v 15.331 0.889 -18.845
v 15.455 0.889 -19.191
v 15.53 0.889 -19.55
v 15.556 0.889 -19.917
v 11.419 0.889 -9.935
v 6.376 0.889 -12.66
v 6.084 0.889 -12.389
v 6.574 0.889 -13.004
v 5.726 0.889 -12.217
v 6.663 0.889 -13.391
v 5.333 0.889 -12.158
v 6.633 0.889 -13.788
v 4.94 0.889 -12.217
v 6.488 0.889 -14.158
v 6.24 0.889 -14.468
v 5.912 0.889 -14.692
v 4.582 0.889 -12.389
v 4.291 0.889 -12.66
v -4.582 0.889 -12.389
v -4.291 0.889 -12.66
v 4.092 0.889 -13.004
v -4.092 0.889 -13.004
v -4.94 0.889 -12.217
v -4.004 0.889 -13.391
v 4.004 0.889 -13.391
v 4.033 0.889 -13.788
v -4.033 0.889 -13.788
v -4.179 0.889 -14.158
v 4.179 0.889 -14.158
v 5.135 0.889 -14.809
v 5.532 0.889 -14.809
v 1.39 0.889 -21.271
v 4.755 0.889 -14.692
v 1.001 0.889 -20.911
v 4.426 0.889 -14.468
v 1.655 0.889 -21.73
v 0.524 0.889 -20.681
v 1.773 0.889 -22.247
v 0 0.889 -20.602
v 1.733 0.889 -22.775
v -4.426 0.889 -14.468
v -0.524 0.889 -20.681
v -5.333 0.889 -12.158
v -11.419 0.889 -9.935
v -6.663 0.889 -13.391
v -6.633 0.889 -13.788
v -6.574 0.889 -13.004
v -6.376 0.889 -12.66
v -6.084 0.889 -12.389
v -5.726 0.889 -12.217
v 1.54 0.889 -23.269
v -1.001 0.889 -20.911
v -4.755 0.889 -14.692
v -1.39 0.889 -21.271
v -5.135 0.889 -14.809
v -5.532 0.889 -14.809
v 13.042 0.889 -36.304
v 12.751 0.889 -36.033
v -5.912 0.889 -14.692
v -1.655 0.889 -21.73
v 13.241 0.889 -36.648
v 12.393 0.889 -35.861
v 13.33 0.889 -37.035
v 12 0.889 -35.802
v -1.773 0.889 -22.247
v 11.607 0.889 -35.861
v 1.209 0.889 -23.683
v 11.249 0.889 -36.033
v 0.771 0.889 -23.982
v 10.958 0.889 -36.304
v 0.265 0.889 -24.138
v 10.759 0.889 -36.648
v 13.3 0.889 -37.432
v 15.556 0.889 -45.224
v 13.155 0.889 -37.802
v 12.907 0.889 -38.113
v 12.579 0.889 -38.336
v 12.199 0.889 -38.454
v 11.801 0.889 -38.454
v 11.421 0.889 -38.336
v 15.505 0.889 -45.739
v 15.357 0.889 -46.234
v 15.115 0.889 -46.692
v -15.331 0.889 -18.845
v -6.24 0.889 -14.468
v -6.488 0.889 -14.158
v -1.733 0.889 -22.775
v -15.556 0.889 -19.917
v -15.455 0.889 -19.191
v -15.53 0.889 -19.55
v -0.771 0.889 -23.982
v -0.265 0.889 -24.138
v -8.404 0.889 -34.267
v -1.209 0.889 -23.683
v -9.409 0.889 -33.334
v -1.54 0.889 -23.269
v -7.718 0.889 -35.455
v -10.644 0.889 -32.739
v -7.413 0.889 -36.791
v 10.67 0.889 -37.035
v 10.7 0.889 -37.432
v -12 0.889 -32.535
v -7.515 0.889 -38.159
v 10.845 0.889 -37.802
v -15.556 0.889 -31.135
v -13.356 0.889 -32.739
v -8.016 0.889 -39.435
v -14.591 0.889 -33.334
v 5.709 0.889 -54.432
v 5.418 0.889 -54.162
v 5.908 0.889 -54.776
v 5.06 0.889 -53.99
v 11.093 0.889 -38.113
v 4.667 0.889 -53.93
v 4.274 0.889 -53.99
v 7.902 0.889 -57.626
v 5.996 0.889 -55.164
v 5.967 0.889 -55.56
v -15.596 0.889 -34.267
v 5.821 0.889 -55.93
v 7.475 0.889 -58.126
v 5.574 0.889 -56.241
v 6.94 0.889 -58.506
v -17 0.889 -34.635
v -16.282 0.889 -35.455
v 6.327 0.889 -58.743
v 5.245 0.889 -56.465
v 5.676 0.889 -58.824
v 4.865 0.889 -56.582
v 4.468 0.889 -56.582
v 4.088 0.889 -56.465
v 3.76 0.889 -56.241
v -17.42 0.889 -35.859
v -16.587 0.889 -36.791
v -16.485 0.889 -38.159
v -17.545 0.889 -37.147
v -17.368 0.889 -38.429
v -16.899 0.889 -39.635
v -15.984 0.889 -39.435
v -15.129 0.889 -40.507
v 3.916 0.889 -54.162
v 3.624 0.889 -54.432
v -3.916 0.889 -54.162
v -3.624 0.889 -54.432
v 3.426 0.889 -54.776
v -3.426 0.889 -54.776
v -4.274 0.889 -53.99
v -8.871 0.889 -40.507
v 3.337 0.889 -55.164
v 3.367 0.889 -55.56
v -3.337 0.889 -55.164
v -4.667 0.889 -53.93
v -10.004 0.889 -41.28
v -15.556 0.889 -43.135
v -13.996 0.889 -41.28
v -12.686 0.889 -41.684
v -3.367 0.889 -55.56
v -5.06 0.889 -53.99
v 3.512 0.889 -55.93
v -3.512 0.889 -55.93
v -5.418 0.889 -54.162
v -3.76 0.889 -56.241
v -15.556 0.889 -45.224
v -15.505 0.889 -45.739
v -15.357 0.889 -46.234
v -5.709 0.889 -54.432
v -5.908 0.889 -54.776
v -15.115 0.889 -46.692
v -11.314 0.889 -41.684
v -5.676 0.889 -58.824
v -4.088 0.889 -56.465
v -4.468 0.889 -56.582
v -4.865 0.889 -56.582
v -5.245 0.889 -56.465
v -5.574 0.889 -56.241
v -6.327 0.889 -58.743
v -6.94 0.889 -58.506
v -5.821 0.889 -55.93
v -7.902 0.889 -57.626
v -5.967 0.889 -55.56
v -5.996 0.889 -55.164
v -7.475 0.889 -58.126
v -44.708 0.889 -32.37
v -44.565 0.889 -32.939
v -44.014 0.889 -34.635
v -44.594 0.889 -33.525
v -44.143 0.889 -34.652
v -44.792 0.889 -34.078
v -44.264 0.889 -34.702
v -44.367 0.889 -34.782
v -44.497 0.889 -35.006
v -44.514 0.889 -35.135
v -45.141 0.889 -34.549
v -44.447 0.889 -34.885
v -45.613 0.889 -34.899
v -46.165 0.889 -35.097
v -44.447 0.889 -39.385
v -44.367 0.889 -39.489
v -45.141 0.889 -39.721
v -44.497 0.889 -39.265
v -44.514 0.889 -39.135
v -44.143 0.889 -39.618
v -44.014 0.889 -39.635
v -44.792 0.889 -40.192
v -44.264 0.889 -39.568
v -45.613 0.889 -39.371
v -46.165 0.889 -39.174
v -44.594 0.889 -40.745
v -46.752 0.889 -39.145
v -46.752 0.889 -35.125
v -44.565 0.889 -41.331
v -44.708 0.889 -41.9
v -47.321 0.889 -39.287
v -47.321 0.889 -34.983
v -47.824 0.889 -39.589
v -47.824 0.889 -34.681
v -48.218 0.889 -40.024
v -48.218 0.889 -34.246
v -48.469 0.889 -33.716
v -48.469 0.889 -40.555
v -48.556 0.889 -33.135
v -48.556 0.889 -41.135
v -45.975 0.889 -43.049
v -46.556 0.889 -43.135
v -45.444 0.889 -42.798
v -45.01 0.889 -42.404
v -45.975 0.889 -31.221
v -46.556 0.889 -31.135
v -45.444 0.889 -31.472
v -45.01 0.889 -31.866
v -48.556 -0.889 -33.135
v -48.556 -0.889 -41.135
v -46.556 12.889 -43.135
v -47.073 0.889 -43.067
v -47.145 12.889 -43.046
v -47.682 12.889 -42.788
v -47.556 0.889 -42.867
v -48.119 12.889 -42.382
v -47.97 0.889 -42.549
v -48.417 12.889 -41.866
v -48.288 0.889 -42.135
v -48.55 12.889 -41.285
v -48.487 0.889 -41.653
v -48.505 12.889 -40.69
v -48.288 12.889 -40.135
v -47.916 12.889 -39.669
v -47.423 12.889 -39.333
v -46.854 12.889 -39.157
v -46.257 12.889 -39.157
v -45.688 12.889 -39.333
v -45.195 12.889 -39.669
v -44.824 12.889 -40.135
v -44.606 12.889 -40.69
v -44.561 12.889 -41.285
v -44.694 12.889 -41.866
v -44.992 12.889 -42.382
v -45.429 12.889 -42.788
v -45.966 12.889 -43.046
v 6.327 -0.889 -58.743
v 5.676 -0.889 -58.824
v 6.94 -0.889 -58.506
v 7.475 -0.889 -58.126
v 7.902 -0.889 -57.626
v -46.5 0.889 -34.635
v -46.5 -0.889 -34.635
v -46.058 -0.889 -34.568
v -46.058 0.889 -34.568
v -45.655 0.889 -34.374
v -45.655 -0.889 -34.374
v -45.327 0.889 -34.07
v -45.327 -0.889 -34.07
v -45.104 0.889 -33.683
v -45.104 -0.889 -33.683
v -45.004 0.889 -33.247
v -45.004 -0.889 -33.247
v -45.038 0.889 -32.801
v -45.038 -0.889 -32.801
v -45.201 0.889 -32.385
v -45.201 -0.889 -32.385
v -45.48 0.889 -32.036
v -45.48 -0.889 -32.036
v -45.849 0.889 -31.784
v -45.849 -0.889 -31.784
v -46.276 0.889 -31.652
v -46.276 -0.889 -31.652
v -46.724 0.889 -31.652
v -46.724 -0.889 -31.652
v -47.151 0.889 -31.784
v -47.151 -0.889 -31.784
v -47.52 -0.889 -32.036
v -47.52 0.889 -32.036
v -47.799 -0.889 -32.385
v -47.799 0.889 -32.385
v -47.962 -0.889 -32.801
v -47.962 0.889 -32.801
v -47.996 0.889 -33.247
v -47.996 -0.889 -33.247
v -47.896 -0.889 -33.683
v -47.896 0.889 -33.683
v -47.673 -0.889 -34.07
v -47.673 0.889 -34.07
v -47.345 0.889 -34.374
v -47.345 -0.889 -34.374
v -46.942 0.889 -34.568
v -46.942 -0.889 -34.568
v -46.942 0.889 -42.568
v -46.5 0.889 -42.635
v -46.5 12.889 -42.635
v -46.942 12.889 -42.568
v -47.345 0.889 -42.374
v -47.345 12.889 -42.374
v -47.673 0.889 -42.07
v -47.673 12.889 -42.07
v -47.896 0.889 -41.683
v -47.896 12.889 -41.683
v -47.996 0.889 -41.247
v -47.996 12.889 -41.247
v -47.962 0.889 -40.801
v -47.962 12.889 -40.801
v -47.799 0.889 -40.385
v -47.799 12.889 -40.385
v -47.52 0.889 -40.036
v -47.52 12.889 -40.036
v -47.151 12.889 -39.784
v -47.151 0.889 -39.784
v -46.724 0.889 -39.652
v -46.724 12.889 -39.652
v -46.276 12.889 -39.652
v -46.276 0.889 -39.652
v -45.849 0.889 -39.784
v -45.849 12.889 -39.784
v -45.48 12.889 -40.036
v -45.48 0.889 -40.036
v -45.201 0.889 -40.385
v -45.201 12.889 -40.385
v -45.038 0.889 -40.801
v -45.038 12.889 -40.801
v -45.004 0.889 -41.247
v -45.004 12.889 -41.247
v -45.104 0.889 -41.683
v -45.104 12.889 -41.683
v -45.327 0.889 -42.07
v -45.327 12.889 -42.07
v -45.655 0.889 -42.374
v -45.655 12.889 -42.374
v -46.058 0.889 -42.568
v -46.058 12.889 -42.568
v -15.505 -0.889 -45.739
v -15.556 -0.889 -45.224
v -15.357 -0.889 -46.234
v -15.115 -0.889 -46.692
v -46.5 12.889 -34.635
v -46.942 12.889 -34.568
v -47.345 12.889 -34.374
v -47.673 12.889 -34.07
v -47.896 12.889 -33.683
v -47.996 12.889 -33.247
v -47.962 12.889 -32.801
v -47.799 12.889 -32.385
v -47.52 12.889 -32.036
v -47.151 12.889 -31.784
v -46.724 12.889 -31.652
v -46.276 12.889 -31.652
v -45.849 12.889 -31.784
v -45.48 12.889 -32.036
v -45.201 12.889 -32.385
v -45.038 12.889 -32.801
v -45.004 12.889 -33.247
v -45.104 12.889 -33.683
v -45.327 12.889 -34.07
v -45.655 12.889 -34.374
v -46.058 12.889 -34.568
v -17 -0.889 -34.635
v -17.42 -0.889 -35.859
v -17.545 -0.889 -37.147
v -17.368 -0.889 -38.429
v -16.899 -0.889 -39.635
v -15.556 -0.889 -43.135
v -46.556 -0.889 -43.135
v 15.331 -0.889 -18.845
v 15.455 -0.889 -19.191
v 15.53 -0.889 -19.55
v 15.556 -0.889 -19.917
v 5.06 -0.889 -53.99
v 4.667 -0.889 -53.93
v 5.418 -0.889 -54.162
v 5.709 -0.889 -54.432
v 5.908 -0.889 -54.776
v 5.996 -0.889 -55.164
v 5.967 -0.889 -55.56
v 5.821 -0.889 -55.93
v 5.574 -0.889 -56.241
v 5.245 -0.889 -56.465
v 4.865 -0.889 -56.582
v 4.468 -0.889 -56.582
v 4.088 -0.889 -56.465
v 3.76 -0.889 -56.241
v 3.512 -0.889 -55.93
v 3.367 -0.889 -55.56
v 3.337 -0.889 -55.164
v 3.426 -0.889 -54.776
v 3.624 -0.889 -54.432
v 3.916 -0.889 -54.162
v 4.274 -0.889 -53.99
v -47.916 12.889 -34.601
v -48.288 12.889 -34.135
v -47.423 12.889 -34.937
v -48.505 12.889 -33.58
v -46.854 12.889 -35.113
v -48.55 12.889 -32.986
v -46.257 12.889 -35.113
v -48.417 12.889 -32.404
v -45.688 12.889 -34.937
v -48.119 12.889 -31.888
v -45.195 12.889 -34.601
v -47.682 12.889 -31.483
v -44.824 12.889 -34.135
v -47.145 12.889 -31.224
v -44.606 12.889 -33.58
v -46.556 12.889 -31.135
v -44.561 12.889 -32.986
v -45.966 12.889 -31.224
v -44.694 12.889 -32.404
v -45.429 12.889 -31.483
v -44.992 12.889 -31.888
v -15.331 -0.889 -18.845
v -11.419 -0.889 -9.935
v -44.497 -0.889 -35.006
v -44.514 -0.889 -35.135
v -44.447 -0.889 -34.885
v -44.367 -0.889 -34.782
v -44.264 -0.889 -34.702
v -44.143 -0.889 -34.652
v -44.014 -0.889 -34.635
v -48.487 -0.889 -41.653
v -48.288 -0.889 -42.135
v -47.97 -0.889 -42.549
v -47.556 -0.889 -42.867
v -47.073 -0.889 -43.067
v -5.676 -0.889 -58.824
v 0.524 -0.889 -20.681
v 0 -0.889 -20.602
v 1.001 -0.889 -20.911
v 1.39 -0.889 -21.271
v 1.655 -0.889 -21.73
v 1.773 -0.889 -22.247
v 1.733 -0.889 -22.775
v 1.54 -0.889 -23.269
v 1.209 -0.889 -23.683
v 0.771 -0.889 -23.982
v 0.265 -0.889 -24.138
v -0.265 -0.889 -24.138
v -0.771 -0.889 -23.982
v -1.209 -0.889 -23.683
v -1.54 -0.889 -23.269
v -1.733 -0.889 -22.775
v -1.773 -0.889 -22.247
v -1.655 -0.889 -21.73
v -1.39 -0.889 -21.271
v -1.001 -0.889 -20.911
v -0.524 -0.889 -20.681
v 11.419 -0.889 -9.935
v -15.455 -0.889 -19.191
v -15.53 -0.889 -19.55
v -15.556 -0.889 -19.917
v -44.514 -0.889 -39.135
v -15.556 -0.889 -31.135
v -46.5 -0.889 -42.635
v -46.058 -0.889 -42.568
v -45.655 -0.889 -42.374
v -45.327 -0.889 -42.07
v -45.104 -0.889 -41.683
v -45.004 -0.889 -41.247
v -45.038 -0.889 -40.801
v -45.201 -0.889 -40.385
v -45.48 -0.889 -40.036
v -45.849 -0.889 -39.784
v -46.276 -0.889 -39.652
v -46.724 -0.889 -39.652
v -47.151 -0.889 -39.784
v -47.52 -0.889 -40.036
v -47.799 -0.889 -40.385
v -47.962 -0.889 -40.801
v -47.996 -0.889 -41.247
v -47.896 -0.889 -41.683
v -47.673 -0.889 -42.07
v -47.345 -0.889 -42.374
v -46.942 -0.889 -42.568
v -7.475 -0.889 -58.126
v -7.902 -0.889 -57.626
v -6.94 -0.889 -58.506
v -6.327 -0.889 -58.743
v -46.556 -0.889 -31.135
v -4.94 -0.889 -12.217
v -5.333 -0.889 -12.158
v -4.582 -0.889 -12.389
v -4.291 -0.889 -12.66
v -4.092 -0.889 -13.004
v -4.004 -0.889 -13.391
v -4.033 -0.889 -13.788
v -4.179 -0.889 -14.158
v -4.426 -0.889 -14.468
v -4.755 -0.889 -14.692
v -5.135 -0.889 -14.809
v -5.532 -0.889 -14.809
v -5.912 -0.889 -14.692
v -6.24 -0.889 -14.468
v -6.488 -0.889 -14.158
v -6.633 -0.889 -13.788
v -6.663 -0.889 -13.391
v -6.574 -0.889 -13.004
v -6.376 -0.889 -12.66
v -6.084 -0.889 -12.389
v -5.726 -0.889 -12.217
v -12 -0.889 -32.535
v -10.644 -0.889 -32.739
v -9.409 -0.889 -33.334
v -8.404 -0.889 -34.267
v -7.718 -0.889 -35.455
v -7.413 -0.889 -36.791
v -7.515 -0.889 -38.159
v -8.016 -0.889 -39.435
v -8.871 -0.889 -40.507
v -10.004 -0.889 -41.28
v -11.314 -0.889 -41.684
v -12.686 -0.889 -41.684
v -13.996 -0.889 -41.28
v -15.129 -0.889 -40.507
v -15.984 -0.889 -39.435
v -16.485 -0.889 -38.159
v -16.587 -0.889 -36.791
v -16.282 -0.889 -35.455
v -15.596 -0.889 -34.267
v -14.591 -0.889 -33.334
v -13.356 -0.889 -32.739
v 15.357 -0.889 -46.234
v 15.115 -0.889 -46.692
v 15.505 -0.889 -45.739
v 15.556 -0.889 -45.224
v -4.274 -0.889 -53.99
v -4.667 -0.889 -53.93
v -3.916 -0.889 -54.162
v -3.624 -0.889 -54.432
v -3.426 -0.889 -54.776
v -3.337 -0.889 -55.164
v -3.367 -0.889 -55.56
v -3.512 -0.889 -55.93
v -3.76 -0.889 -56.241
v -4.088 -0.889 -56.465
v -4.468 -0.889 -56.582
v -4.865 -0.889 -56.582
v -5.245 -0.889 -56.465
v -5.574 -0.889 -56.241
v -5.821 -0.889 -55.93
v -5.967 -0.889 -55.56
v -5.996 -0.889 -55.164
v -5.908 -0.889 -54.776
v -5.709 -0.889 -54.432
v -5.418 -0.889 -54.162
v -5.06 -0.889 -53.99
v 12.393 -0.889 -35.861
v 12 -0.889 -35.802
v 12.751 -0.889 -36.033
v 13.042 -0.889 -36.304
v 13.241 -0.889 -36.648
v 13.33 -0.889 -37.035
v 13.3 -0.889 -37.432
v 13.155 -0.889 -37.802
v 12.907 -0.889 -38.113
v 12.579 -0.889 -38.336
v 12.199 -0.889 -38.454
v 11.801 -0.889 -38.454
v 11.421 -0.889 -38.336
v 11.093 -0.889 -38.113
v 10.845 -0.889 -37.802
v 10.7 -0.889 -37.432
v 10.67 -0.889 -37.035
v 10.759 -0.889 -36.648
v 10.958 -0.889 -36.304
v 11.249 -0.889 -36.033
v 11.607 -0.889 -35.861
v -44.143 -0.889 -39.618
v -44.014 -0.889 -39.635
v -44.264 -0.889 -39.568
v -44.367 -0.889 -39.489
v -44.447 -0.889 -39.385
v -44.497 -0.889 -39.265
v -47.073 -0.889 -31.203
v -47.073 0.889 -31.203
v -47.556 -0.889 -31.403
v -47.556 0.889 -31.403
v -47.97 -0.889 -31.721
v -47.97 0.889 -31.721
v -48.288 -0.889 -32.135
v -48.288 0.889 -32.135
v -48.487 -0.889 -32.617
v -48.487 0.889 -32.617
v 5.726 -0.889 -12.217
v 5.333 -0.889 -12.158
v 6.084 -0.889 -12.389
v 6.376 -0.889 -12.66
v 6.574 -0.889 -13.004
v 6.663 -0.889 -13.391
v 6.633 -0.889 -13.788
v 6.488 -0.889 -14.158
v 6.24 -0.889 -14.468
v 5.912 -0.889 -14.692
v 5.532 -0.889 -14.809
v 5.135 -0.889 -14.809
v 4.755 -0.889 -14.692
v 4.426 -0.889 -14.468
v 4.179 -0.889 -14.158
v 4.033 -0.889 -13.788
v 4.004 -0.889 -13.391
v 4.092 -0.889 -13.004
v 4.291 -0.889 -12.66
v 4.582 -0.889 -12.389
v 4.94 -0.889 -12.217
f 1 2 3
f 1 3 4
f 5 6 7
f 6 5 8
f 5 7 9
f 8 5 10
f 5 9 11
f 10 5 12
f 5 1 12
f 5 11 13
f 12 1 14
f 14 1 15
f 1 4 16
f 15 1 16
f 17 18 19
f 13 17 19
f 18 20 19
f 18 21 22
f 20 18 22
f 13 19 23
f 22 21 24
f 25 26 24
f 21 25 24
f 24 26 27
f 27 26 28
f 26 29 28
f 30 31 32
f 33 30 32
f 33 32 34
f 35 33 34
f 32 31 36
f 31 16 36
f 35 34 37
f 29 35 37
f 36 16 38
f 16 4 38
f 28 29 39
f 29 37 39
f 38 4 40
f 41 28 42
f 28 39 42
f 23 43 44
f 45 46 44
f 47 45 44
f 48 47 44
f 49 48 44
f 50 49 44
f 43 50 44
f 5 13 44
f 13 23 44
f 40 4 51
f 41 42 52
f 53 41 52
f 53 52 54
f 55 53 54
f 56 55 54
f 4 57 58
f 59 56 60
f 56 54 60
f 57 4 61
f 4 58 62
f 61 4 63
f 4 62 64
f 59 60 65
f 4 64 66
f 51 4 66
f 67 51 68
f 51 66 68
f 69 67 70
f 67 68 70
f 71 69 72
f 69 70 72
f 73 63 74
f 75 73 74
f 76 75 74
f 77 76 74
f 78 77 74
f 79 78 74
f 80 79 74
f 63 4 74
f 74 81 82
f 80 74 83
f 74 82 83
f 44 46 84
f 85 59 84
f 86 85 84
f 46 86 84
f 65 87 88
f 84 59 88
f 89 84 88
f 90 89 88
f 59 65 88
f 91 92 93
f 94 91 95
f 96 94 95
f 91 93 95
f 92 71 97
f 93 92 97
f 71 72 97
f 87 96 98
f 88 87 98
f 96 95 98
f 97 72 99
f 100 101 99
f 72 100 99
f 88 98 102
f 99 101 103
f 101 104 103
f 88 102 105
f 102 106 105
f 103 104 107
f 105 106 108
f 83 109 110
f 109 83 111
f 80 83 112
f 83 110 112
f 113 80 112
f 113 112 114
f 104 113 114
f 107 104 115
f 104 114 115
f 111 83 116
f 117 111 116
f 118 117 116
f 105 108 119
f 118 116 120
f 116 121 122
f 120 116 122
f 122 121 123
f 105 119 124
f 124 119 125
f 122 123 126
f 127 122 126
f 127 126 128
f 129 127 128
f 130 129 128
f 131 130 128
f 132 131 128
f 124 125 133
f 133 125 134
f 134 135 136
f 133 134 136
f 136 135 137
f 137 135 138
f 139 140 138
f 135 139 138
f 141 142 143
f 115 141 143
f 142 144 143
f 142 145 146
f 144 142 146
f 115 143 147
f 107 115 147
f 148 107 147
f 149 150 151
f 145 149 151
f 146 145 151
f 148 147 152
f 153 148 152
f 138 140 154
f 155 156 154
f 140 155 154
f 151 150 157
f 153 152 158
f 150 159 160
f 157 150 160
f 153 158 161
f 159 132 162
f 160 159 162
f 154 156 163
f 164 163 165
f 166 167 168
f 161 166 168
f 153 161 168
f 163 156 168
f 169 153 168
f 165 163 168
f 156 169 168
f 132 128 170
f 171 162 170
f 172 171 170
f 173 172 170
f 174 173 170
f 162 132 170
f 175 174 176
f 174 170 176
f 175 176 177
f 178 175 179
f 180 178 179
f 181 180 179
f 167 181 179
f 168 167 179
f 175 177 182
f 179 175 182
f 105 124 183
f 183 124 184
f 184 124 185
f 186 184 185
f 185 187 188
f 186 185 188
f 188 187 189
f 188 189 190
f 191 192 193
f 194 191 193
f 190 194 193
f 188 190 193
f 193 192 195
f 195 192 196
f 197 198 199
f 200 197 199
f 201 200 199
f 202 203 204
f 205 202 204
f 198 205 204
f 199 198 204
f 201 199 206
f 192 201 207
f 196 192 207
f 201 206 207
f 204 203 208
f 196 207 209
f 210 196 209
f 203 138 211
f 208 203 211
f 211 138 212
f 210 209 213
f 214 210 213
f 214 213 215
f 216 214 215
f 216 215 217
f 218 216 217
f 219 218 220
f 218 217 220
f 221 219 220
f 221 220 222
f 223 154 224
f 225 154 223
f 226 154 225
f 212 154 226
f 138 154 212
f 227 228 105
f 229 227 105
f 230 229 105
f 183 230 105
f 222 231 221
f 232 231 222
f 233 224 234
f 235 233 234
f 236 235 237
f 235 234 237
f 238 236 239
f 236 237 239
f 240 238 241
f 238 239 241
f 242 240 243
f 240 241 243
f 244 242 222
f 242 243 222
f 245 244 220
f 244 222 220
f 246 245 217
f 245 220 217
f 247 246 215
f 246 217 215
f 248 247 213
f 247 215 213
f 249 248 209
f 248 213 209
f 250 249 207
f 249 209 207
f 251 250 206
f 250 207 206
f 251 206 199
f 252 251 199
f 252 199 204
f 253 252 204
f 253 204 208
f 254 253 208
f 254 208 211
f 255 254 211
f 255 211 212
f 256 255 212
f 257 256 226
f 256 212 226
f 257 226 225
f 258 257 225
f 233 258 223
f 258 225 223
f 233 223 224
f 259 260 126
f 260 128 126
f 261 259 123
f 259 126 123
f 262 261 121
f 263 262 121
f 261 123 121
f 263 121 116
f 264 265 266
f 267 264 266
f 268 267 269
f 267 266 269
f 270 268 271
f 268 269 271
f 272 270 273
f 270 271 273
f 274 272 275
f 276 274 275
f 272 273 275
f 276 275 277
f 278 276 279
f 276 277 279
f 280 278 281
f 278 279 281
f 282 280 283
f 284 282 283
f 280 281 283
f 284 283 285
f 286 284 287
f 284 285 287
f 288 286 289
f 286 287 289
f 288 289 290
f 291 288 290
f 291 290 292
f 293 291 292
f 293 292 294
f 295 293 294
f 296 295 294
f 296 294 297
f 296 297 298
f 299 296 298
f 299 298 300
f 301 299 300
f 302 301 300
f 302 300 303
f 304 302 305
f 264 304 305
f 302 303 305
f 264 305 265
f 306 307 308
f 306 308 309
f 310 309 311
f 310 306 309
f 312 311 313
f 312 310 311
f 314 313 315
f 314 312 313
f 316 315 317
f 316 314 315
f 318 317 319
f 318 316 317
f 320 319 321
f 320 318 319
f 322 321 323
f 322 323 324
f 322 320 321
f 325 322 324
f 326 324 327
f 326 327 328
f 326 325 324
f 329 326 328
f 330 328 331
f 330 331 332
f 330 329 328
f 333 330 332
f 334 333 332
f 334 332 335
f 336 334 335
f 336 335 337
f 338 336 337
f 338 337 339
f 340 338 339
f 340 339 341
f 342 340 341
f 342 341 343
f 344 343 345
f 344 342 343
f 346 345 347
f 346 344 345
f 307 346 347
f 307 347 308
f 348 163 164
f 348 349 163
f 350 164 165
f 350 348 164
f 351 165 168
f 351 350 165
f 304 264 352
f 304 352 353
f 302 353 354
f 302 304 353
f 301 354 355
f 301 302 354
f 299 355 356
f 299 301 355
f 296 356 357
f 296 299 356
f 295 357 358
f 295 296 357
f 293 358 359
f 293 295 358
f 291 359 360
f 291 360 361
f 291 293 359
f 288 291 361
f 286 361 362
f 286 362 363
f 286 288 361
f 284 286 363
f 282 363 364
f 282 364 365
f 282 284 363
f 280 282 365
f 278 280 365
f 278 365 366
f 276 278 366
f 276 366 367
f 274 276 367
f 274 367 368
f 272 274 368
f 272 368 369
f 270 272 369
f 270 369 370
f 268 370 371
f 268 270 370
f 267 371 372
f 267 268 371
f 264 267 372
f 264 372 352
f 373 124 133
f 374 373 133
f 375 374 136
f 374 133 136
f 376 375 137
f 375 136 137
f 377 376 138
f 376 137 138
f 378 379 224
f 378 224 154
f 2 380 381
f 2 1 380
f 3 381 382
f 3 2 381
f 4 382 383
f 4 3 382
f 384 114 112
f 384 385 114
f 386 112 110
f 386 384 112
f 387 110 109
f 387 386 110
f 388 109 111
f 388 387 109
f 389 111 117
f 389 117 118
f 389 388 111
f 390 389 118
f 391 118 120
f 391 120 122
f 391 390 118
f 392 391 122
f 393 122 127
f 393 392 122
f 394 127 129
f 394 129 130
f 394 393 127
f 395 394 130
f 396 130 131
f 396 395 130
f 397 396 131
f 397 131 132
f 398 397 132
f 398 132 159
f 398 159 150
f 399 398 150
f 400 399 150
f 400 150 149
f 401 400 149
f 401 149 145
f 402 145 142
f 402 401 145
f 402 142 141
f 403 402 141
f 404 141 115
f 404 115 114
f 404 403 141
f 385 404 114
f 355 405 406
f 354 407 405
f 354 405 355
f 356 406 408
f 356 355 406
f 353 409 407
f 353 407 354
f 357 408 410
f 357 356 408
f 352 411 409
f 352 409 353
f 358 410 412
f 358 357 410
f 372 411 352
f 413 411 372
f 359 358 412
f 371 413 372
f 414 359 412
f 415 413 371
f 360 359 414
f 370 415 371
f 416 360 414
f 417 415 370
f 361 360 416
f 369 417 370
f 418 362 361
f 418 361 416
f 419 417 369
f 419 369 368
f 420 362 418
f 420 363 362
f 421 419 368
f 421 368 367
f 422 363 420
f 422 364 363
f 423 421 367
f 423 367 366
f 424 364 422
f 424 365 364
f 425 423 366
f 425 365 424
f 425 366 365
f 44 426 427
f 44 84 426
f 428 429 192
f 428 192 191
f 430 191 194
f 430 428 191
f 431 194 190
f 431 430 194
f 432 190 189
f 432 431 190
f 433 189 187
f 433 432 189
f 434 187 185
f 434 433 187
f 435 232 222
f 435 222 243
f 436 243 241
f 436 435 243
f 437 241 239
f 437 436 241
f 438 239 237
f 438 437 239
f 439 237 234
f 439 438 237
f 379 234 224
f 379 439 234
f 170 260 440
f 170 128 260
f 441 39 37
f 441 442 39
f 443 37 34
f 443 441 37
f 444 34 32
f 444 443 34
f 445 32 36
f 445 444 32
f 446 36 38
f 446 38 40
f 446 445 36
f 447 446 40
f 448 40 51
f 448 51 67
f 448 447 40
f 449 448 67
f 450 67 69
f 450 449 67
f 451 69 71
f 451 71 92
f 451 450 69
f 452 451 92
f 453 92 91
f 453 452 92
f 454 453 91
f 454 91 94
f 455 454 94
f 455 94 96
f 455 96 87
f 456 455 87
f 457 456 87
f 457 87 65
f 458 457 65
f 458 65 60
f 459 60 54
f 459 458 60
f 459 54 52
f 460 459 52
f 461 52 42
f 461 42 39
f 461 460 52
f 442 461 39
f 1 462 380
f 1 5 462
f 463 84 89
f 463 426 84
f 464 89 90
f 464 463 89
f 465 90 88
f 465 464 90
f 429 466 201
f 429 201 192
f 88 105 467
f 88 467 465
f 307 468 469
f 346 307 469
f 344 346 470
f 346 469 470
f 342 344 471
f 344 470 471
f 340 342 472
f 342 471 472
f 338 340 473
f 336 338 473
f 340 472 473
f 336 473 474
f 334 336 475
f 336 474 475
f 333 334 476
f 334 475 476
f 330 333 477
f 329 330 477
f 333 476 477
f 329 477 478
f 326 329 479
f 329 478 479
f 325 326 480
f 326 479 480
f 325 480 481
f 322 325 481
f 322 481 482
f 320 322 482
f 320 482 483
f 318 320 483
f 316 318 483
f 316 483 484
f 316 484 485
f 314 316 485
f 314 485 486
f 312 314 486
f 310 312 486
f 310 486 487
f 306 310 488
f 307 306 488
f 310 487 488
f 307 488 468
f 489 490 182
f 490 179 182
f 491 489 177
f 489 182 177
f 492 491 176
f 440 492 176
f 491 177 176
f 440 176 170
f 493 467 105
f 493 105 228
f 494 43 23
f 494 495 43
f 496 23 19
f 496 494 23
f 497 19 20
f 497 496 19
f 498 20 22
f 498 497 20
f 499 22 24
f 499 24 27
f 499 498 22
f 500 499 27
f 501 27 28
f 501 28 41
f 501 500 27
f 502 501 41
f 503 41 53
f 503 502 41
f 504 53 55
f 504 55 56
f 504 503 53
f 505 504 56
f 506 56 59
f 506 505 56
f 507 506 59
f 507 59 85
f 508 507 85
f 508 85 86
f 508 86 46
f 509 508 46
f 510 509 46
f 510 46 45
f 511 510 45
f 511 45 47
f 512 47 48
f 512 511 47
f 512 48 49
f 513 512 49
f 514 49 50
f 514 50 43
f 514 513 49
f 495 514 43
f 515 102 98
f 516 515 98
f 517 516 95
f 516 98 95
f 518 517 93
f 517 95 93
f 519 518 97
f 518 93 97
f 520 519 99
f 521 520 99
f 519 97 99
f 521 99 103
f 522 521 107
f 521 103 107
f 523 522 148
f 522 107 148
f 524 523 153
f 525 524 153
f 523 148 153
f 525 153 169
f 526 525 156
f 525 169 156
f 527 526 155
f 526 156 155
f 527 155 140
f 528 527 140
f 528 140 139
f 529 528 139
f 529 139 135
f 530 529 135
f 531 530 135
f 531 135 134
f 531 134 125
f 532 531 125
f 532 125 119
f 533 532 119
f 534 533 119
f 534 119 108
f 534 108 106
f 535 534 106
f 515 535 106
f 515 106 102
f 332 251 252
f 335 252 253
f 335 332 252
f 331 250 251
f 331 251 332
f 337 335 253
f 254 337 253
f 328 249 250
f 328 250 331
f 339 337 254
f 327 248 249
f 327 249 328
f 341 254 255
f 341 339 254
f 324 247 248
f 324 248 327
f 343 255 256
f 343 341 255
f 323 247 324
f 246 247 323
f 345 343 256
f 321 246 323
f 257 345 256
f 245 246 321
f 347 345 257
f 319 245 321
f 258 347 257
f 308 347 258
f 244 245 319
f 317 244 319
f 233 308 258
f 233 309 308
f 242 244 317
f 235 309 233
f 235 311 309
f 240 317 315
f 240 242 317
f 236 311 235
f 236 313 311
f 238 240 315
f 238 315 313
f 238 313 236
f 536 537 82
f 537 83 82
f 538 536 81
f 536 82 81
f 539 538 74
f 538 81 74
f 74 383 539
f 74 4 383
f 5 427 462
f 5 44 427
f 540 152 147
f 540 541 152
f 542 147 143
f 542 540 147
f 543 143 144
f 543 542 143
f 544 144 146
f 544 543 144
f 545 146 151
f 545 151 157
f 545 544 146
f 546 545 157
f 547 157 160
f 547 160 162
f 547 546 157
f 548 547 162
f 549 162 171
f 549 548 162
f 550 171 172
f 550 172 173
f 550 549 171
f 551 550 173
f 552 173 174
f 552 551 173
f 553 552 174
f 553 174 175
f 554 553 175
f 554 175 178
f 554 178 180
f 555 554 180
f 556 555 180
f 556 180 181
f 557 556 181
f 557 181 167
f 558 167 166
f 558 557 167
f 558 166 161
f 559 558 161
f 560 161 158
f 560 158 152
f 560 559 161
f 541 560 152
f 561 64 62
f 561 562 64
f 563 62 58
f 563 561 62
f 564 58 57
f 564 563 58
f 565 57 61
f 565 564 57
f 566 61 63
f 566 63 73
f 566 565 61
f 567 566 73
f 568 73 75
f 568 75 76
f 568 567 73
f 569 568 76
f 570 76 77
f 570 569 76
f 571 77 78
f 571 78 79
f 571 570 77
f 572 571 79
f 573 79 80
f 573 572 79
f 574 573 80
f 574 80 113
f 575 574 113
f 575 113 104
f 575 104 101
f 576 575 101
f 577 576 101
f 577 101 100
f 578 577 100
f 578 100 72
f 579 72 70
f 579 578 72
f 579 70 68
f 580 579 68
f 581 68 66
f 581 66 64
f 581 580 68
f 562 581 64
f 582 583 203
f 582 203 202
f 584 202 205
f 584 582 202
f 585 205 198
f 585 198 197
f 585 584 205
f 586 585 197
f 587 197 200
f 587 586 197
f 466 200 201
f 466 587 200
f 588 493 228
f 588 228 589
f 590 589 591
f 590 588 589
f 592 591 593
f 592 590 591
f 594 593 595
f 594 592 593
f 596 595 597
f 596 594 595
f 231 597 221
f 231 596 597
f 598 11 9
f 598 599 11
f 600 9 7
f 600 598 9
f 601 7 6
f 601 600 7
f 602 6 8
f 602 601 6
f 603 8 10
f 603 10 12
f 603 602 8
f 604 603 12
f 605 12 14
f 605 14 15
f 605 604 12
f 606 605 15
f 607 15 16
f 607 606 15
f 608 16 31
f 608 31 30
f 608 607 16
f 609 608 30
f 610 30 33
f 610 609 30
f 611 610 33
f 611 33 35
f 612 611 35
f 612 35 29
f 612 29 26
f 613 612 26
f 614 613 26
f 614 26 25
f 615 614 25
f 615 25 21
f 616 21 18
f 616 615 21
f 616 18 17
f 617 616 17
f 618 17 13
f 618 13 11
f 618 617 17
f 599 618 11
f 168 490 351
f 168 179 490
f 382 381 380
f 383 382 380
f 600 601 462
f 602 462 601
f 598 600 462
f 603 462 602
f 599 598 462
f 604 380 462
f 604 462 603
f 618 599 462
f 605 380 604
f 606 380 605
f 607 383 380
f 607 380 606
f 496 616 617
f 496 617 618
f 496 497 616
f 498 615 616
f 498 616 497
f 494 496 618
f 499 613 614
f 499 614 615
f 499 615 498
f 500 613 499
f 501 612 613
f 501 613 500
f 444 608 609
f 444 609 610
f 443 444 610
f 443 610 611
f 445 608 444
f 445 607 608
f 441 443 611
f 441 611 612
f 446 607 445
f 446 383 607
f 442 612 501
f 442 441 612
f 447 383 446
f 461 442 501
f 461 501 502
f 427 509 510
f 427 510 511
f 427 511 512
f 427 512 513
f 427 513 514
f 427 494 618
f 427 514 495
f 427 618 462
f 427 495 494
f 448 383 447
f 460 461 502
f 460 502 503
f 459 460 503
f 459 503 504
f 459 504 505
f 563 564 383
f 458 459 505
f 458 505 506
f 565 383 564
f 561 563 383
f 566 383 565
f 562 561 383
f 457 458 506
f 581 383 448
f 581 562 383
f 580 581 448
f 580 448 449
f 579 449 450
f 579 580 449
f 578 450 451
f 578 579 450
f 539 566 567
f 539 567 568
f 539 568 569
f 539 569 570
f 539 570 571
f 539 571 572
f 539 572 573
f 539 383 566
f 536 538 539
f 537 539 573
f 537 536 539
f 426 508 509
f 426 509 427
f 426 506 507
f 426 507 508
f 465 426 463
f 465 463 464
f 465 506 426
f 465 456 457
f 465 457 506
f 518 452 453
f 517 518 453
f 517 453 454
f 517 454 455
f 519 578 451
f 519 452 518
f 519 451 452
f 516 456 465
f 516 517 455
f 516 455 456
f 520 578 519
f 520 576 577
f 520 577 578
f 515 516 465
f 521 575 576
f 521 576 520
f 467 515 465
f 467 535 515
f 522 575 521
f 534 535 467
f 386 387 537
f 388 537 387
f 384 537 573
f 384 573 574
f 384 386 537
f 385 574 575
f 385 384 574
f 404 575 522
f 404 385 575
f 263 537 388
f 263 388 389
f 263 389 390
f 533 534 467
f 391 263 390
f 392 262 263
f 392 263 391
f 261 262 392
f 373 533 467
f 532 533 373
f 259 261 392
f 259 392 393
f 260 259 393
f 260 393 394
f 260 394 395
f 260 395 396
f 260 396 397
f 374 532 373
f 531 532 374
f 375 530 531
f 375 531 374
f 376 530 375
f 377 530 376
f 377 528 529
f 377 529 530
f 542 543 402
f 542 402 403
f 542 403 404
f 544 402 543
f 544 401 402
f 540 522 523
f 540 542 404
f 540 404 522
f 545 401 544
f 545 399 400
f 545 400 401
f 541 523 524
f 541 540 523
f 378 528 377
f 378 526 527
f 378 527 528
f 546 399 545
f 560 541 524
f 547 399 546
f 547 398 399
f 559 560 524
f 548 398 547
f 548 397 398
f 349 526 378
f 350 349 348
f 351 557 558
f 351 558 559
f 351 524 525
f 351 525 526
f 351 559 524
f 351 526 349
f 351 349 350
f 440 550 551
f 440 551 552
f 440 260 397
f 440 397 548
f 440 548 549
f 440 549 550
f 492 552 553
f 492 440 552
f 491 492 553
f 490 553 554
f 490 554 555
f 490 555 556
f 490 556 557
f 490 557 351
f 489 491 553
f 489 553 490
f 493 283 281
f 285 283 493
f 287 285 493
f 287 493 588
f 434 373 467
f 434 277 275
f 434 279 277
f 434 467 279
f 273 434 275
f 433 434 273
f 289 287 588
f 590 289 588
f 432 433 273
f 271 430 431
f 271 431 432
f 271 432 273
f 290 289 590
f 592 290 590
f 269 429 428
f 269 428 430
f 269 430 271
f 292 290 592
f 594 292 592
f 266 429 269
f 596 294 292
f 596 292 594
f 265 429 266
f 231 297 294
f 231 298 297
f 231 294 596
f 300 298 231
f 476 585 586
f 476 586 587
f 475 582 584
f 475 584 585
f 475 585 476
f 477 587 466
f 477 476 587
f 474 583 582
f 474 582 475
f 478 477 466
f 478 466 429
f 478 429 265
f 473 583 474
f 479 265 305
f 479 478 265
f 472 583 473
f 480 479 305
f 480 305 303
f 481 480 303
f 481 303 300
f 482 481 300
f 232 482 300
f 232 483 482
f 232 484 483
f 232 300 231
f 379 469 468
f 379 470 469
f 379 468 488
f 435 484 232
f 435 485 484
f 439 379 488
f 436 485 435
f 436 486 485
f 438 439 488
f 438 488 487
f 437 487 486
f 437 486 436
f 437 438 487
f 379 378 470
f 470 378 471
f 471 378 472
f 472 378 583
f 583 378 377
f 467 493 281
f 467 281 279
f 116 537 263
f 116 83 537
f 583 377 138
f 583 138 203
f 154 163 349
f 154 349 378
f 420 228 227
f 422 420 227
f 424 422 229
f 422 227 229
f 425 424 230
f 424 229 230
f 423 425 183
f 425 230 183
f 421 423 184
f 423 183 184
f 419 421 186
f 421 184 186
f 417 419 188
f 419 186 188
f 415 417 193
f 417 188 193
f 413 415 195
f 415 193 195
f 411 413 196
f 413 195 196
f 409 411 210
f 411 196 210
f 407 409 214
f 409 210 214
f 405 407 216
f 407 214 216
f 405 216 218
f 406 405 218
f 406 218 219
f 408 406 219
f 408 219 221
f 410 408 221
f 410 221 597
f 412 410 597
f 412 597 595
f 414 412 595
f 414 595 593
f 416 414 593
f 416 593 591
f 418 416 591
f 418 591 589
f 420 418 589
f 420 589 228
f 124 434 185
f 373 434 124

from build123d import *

# Parameters (mm, degrees)
CROQUIS1_R              = 2
CROQUIS1_R_2            = 1.5
SALIENTE_EXTRUIR1_DEPTH = 1
REDONDEO1_R             = 3
SCALE1_SCALE            = 0.888889
SKETCH1_R               = 1.5
BOSS_EXTRUDE1_DEPTH     = 1.777778
BOSS_EXTRUDE2_DEPTH     = 1.777778
SKETCH3_R               = 4.6
CUT_EXTRUDE1_DEPTH      = 10
SKETCH4_R               = 2
SKETCH4_R_2             = 1.5
BOSS_EXTRUDE3_DEPTH     = 12


with BuildPart() as part:
    # Croquis1 → Saliente-Extruir1 (new, symmetric)
    with BuildSketch(Plane(origin=(0, 0, 0), x_dir=(1, 0, 0), z_dir=(0, 1, 0))):
        Polygon((12.846621, 7), (17.5, 17.599716), (17.5, 47.599716), (8, 62), (-8, 62), (-17.5, 47.599716), (-17.5, 17.599716), (-12.846621, 7), align=None)
        with Locations(Location((0, 21, 0), (0, 0, 270))):
            Circle(CROQUIS1_R, mode=Mode.SUBTRACT)
        with Locations(Location((-5.25, 57.994262, 0), (0, 0, 270))):
            Circle(CROQUIS1_R_2, mode=Mode.SUBTRACT)
        with Locations(Location((-13.5, 37.599716, 0), (0, 0, 270))):
            Circle(CROQUIS1_R_2, mode=Mode.SUBTRACT)
        with Locations(Location((13.5, 37.599716, 0), (0, 0, 270))):
            Circle(CROQUIS1_R_2, mode=Mode.SUBTRACT)
        with Locations(Location((5.25, 57.994262, 0), (0, 0, 270))):
            Circle(CROQUIS1_R_2, mode=Mode.SUBTRACT)
        with Locations(Location((-6, 11, 0), (0, 0, 270))):
            Circle(CROQUIS1_R_2, mode=Mode.SUBTRACT)
        with Locations(Location((6, 11, 0), (0, 0, 270))):
            Circle(CROQUIS1_R_2, mode=Mode.SUBTRACT)
    extrude(amount=SALIENTE_EXTRUIR1_DEPTH, both=True)

    # Redondeo1
    redondeo1_edges = [part.edges().sort_by_distance(p)[0] for p in [
        (17.5, 0, -17.599716),
        (-17.5, 0, -17.599716),
        (-17.5, 0, -47.599716),
        (-8, 0, -62),
        (8, 0, -62),
        (17.5, 0, -47.599716),
    ]]
    fillet(redondeo1_edges, radius=REDONDEO1_R)


with BuildPart() as part_1:
    # Scale1: scaled about (0, 0, -33.418377)
    add(part.part.scale(SCALE1_SCALE).moved(Location((0, 0, -3.713153))))

    # Sketch1 → Boss-Extrude1 (add)
    with BuildSketch(Plane.XZ.offset(0.888889)):
        with BuildLine():
            Line((-15.555556, -31.135123), (-46.555556, -31.135123))
            ThreePointArc((-46.555556, -31.135123), (-47.969769, -31.720909), (-48.555556, -33.135123))
            Line((-48.555556, -33.135123), (-48.555556, -41.135123))
            ThreePointArc((-48.555556, -41.135123), (-47.969769, -42.549336), (-46.555556, -43.135123))
            Line((-46.555556, -43.135123), (-15.555556, -43.135123))
            Line((-15.555556, -43.135123), (-15.555556, -39.635123))
            Line((-15.555556, -39.635123), (-44.013891, -39.635123))
            ThreePointArc((-44.013891, -39.635123), (-44.367444, -39.488676), (-44.513891, -39.135123))
            Line((-44.513891, -39.135123), (-44.513891, -35.135123))
            ThreePointArc((-44.513891, -35.135123), (-44.367444, -34.781569), (-44.013891, -34.635123))
            Line((-44.013891, -34.635123), (-15.555556, -34.635123))
            Line((-15.555556, -34.635123), (-15.555556, -31.135123))
        make_face()
        with Locations(Location((-46.5, -33.135123, 0), (0, 0, 270))):
            Circle(SKETCH1_R, mode=Mode.SUBTRACT)
        with Locations(Location((-46.5, -41.135123, 0), (0, 0, 270))):
            Circle(SKETCH1_R, mode=Mode.SUBTRACT)
    extrude(amount=-BOSS_EXTRUDE1_DEPTH)

    # Sketch2 → Boss-Extrude2 (add)
    with BuildSketch(Plane(origin=(0, 0.888889, 0), x_dir=(1, 0, 0), z_dir=(0, 1, 0))):
        with BuildLine():
            Line((-16.898979, 39.635123), (-15.555556, 39.635123))
            Line((-15.555556, 39.635123), (-15.555556, 34.635123))
            Line((-15.555556, 34.635123), (-17.00037, 34.635123))
            ThreePointArc((-17.00037, 34.635123), (-17.545203, 37.147199), (-16.898979, 39.635123))
        make_face()
    extrude(amount=-BOSS_EXTRUDE2_DEPTH)

    # Sketch3 → Cut-Extrude1 (cut)
    with BuildSketch(Plane(origin=(0, 0.888889, 0), x_dir=(1, 0, 0), z_dir=(0, 1, 0))):
        with Locations(Location((-12, 37.135123, 0), (0, 0, 270))):
            Circle(SKETCH3_R)
    extrude(amount=-CUT_EXTRUDE1_DEPTH, mode=Mode.SUBTRACT)

    # Sketch4 → Boss-Extrude3 (add)
    # profile 1 of 2: a face of its own
    with BuildSketch(Plane(origin=(0, 0.888889, 0), x_dir=(1, 0, 0), z_dir=(0, 1, 0))):
        with Locations(Location((-46.555556, 41.135123, 0), (0, 0, 90))):
            Circle(SKETCH4_R)
        with Locations(Location((-46.5, 41.135123, 0), (0, 0, 90))):
            Circle(SKETCH4_R_2, mode=Mode.SUBTRACT)
    # profile 2 of 2: a face of its own
    with BuildSketch(Plane(origin=(0, 0.888889, 0), x_dir=(1, 0, 0), z_dir=(0, 1, 0))):
        with Locations(Location((-46.555556, 33.135123, 0), (0, 0, 270))):
            Circle(SKETCH4_R)
        with Locations(Location((-46.5, 33.135123, 0), (0, 0, 90))):
            Circle(SKETCH4_R_2, mode=Mode.SUBTRACT)
    extrude(amount=BOSS_EXTRUDE3_DEPTH)


solid = part_1.part
